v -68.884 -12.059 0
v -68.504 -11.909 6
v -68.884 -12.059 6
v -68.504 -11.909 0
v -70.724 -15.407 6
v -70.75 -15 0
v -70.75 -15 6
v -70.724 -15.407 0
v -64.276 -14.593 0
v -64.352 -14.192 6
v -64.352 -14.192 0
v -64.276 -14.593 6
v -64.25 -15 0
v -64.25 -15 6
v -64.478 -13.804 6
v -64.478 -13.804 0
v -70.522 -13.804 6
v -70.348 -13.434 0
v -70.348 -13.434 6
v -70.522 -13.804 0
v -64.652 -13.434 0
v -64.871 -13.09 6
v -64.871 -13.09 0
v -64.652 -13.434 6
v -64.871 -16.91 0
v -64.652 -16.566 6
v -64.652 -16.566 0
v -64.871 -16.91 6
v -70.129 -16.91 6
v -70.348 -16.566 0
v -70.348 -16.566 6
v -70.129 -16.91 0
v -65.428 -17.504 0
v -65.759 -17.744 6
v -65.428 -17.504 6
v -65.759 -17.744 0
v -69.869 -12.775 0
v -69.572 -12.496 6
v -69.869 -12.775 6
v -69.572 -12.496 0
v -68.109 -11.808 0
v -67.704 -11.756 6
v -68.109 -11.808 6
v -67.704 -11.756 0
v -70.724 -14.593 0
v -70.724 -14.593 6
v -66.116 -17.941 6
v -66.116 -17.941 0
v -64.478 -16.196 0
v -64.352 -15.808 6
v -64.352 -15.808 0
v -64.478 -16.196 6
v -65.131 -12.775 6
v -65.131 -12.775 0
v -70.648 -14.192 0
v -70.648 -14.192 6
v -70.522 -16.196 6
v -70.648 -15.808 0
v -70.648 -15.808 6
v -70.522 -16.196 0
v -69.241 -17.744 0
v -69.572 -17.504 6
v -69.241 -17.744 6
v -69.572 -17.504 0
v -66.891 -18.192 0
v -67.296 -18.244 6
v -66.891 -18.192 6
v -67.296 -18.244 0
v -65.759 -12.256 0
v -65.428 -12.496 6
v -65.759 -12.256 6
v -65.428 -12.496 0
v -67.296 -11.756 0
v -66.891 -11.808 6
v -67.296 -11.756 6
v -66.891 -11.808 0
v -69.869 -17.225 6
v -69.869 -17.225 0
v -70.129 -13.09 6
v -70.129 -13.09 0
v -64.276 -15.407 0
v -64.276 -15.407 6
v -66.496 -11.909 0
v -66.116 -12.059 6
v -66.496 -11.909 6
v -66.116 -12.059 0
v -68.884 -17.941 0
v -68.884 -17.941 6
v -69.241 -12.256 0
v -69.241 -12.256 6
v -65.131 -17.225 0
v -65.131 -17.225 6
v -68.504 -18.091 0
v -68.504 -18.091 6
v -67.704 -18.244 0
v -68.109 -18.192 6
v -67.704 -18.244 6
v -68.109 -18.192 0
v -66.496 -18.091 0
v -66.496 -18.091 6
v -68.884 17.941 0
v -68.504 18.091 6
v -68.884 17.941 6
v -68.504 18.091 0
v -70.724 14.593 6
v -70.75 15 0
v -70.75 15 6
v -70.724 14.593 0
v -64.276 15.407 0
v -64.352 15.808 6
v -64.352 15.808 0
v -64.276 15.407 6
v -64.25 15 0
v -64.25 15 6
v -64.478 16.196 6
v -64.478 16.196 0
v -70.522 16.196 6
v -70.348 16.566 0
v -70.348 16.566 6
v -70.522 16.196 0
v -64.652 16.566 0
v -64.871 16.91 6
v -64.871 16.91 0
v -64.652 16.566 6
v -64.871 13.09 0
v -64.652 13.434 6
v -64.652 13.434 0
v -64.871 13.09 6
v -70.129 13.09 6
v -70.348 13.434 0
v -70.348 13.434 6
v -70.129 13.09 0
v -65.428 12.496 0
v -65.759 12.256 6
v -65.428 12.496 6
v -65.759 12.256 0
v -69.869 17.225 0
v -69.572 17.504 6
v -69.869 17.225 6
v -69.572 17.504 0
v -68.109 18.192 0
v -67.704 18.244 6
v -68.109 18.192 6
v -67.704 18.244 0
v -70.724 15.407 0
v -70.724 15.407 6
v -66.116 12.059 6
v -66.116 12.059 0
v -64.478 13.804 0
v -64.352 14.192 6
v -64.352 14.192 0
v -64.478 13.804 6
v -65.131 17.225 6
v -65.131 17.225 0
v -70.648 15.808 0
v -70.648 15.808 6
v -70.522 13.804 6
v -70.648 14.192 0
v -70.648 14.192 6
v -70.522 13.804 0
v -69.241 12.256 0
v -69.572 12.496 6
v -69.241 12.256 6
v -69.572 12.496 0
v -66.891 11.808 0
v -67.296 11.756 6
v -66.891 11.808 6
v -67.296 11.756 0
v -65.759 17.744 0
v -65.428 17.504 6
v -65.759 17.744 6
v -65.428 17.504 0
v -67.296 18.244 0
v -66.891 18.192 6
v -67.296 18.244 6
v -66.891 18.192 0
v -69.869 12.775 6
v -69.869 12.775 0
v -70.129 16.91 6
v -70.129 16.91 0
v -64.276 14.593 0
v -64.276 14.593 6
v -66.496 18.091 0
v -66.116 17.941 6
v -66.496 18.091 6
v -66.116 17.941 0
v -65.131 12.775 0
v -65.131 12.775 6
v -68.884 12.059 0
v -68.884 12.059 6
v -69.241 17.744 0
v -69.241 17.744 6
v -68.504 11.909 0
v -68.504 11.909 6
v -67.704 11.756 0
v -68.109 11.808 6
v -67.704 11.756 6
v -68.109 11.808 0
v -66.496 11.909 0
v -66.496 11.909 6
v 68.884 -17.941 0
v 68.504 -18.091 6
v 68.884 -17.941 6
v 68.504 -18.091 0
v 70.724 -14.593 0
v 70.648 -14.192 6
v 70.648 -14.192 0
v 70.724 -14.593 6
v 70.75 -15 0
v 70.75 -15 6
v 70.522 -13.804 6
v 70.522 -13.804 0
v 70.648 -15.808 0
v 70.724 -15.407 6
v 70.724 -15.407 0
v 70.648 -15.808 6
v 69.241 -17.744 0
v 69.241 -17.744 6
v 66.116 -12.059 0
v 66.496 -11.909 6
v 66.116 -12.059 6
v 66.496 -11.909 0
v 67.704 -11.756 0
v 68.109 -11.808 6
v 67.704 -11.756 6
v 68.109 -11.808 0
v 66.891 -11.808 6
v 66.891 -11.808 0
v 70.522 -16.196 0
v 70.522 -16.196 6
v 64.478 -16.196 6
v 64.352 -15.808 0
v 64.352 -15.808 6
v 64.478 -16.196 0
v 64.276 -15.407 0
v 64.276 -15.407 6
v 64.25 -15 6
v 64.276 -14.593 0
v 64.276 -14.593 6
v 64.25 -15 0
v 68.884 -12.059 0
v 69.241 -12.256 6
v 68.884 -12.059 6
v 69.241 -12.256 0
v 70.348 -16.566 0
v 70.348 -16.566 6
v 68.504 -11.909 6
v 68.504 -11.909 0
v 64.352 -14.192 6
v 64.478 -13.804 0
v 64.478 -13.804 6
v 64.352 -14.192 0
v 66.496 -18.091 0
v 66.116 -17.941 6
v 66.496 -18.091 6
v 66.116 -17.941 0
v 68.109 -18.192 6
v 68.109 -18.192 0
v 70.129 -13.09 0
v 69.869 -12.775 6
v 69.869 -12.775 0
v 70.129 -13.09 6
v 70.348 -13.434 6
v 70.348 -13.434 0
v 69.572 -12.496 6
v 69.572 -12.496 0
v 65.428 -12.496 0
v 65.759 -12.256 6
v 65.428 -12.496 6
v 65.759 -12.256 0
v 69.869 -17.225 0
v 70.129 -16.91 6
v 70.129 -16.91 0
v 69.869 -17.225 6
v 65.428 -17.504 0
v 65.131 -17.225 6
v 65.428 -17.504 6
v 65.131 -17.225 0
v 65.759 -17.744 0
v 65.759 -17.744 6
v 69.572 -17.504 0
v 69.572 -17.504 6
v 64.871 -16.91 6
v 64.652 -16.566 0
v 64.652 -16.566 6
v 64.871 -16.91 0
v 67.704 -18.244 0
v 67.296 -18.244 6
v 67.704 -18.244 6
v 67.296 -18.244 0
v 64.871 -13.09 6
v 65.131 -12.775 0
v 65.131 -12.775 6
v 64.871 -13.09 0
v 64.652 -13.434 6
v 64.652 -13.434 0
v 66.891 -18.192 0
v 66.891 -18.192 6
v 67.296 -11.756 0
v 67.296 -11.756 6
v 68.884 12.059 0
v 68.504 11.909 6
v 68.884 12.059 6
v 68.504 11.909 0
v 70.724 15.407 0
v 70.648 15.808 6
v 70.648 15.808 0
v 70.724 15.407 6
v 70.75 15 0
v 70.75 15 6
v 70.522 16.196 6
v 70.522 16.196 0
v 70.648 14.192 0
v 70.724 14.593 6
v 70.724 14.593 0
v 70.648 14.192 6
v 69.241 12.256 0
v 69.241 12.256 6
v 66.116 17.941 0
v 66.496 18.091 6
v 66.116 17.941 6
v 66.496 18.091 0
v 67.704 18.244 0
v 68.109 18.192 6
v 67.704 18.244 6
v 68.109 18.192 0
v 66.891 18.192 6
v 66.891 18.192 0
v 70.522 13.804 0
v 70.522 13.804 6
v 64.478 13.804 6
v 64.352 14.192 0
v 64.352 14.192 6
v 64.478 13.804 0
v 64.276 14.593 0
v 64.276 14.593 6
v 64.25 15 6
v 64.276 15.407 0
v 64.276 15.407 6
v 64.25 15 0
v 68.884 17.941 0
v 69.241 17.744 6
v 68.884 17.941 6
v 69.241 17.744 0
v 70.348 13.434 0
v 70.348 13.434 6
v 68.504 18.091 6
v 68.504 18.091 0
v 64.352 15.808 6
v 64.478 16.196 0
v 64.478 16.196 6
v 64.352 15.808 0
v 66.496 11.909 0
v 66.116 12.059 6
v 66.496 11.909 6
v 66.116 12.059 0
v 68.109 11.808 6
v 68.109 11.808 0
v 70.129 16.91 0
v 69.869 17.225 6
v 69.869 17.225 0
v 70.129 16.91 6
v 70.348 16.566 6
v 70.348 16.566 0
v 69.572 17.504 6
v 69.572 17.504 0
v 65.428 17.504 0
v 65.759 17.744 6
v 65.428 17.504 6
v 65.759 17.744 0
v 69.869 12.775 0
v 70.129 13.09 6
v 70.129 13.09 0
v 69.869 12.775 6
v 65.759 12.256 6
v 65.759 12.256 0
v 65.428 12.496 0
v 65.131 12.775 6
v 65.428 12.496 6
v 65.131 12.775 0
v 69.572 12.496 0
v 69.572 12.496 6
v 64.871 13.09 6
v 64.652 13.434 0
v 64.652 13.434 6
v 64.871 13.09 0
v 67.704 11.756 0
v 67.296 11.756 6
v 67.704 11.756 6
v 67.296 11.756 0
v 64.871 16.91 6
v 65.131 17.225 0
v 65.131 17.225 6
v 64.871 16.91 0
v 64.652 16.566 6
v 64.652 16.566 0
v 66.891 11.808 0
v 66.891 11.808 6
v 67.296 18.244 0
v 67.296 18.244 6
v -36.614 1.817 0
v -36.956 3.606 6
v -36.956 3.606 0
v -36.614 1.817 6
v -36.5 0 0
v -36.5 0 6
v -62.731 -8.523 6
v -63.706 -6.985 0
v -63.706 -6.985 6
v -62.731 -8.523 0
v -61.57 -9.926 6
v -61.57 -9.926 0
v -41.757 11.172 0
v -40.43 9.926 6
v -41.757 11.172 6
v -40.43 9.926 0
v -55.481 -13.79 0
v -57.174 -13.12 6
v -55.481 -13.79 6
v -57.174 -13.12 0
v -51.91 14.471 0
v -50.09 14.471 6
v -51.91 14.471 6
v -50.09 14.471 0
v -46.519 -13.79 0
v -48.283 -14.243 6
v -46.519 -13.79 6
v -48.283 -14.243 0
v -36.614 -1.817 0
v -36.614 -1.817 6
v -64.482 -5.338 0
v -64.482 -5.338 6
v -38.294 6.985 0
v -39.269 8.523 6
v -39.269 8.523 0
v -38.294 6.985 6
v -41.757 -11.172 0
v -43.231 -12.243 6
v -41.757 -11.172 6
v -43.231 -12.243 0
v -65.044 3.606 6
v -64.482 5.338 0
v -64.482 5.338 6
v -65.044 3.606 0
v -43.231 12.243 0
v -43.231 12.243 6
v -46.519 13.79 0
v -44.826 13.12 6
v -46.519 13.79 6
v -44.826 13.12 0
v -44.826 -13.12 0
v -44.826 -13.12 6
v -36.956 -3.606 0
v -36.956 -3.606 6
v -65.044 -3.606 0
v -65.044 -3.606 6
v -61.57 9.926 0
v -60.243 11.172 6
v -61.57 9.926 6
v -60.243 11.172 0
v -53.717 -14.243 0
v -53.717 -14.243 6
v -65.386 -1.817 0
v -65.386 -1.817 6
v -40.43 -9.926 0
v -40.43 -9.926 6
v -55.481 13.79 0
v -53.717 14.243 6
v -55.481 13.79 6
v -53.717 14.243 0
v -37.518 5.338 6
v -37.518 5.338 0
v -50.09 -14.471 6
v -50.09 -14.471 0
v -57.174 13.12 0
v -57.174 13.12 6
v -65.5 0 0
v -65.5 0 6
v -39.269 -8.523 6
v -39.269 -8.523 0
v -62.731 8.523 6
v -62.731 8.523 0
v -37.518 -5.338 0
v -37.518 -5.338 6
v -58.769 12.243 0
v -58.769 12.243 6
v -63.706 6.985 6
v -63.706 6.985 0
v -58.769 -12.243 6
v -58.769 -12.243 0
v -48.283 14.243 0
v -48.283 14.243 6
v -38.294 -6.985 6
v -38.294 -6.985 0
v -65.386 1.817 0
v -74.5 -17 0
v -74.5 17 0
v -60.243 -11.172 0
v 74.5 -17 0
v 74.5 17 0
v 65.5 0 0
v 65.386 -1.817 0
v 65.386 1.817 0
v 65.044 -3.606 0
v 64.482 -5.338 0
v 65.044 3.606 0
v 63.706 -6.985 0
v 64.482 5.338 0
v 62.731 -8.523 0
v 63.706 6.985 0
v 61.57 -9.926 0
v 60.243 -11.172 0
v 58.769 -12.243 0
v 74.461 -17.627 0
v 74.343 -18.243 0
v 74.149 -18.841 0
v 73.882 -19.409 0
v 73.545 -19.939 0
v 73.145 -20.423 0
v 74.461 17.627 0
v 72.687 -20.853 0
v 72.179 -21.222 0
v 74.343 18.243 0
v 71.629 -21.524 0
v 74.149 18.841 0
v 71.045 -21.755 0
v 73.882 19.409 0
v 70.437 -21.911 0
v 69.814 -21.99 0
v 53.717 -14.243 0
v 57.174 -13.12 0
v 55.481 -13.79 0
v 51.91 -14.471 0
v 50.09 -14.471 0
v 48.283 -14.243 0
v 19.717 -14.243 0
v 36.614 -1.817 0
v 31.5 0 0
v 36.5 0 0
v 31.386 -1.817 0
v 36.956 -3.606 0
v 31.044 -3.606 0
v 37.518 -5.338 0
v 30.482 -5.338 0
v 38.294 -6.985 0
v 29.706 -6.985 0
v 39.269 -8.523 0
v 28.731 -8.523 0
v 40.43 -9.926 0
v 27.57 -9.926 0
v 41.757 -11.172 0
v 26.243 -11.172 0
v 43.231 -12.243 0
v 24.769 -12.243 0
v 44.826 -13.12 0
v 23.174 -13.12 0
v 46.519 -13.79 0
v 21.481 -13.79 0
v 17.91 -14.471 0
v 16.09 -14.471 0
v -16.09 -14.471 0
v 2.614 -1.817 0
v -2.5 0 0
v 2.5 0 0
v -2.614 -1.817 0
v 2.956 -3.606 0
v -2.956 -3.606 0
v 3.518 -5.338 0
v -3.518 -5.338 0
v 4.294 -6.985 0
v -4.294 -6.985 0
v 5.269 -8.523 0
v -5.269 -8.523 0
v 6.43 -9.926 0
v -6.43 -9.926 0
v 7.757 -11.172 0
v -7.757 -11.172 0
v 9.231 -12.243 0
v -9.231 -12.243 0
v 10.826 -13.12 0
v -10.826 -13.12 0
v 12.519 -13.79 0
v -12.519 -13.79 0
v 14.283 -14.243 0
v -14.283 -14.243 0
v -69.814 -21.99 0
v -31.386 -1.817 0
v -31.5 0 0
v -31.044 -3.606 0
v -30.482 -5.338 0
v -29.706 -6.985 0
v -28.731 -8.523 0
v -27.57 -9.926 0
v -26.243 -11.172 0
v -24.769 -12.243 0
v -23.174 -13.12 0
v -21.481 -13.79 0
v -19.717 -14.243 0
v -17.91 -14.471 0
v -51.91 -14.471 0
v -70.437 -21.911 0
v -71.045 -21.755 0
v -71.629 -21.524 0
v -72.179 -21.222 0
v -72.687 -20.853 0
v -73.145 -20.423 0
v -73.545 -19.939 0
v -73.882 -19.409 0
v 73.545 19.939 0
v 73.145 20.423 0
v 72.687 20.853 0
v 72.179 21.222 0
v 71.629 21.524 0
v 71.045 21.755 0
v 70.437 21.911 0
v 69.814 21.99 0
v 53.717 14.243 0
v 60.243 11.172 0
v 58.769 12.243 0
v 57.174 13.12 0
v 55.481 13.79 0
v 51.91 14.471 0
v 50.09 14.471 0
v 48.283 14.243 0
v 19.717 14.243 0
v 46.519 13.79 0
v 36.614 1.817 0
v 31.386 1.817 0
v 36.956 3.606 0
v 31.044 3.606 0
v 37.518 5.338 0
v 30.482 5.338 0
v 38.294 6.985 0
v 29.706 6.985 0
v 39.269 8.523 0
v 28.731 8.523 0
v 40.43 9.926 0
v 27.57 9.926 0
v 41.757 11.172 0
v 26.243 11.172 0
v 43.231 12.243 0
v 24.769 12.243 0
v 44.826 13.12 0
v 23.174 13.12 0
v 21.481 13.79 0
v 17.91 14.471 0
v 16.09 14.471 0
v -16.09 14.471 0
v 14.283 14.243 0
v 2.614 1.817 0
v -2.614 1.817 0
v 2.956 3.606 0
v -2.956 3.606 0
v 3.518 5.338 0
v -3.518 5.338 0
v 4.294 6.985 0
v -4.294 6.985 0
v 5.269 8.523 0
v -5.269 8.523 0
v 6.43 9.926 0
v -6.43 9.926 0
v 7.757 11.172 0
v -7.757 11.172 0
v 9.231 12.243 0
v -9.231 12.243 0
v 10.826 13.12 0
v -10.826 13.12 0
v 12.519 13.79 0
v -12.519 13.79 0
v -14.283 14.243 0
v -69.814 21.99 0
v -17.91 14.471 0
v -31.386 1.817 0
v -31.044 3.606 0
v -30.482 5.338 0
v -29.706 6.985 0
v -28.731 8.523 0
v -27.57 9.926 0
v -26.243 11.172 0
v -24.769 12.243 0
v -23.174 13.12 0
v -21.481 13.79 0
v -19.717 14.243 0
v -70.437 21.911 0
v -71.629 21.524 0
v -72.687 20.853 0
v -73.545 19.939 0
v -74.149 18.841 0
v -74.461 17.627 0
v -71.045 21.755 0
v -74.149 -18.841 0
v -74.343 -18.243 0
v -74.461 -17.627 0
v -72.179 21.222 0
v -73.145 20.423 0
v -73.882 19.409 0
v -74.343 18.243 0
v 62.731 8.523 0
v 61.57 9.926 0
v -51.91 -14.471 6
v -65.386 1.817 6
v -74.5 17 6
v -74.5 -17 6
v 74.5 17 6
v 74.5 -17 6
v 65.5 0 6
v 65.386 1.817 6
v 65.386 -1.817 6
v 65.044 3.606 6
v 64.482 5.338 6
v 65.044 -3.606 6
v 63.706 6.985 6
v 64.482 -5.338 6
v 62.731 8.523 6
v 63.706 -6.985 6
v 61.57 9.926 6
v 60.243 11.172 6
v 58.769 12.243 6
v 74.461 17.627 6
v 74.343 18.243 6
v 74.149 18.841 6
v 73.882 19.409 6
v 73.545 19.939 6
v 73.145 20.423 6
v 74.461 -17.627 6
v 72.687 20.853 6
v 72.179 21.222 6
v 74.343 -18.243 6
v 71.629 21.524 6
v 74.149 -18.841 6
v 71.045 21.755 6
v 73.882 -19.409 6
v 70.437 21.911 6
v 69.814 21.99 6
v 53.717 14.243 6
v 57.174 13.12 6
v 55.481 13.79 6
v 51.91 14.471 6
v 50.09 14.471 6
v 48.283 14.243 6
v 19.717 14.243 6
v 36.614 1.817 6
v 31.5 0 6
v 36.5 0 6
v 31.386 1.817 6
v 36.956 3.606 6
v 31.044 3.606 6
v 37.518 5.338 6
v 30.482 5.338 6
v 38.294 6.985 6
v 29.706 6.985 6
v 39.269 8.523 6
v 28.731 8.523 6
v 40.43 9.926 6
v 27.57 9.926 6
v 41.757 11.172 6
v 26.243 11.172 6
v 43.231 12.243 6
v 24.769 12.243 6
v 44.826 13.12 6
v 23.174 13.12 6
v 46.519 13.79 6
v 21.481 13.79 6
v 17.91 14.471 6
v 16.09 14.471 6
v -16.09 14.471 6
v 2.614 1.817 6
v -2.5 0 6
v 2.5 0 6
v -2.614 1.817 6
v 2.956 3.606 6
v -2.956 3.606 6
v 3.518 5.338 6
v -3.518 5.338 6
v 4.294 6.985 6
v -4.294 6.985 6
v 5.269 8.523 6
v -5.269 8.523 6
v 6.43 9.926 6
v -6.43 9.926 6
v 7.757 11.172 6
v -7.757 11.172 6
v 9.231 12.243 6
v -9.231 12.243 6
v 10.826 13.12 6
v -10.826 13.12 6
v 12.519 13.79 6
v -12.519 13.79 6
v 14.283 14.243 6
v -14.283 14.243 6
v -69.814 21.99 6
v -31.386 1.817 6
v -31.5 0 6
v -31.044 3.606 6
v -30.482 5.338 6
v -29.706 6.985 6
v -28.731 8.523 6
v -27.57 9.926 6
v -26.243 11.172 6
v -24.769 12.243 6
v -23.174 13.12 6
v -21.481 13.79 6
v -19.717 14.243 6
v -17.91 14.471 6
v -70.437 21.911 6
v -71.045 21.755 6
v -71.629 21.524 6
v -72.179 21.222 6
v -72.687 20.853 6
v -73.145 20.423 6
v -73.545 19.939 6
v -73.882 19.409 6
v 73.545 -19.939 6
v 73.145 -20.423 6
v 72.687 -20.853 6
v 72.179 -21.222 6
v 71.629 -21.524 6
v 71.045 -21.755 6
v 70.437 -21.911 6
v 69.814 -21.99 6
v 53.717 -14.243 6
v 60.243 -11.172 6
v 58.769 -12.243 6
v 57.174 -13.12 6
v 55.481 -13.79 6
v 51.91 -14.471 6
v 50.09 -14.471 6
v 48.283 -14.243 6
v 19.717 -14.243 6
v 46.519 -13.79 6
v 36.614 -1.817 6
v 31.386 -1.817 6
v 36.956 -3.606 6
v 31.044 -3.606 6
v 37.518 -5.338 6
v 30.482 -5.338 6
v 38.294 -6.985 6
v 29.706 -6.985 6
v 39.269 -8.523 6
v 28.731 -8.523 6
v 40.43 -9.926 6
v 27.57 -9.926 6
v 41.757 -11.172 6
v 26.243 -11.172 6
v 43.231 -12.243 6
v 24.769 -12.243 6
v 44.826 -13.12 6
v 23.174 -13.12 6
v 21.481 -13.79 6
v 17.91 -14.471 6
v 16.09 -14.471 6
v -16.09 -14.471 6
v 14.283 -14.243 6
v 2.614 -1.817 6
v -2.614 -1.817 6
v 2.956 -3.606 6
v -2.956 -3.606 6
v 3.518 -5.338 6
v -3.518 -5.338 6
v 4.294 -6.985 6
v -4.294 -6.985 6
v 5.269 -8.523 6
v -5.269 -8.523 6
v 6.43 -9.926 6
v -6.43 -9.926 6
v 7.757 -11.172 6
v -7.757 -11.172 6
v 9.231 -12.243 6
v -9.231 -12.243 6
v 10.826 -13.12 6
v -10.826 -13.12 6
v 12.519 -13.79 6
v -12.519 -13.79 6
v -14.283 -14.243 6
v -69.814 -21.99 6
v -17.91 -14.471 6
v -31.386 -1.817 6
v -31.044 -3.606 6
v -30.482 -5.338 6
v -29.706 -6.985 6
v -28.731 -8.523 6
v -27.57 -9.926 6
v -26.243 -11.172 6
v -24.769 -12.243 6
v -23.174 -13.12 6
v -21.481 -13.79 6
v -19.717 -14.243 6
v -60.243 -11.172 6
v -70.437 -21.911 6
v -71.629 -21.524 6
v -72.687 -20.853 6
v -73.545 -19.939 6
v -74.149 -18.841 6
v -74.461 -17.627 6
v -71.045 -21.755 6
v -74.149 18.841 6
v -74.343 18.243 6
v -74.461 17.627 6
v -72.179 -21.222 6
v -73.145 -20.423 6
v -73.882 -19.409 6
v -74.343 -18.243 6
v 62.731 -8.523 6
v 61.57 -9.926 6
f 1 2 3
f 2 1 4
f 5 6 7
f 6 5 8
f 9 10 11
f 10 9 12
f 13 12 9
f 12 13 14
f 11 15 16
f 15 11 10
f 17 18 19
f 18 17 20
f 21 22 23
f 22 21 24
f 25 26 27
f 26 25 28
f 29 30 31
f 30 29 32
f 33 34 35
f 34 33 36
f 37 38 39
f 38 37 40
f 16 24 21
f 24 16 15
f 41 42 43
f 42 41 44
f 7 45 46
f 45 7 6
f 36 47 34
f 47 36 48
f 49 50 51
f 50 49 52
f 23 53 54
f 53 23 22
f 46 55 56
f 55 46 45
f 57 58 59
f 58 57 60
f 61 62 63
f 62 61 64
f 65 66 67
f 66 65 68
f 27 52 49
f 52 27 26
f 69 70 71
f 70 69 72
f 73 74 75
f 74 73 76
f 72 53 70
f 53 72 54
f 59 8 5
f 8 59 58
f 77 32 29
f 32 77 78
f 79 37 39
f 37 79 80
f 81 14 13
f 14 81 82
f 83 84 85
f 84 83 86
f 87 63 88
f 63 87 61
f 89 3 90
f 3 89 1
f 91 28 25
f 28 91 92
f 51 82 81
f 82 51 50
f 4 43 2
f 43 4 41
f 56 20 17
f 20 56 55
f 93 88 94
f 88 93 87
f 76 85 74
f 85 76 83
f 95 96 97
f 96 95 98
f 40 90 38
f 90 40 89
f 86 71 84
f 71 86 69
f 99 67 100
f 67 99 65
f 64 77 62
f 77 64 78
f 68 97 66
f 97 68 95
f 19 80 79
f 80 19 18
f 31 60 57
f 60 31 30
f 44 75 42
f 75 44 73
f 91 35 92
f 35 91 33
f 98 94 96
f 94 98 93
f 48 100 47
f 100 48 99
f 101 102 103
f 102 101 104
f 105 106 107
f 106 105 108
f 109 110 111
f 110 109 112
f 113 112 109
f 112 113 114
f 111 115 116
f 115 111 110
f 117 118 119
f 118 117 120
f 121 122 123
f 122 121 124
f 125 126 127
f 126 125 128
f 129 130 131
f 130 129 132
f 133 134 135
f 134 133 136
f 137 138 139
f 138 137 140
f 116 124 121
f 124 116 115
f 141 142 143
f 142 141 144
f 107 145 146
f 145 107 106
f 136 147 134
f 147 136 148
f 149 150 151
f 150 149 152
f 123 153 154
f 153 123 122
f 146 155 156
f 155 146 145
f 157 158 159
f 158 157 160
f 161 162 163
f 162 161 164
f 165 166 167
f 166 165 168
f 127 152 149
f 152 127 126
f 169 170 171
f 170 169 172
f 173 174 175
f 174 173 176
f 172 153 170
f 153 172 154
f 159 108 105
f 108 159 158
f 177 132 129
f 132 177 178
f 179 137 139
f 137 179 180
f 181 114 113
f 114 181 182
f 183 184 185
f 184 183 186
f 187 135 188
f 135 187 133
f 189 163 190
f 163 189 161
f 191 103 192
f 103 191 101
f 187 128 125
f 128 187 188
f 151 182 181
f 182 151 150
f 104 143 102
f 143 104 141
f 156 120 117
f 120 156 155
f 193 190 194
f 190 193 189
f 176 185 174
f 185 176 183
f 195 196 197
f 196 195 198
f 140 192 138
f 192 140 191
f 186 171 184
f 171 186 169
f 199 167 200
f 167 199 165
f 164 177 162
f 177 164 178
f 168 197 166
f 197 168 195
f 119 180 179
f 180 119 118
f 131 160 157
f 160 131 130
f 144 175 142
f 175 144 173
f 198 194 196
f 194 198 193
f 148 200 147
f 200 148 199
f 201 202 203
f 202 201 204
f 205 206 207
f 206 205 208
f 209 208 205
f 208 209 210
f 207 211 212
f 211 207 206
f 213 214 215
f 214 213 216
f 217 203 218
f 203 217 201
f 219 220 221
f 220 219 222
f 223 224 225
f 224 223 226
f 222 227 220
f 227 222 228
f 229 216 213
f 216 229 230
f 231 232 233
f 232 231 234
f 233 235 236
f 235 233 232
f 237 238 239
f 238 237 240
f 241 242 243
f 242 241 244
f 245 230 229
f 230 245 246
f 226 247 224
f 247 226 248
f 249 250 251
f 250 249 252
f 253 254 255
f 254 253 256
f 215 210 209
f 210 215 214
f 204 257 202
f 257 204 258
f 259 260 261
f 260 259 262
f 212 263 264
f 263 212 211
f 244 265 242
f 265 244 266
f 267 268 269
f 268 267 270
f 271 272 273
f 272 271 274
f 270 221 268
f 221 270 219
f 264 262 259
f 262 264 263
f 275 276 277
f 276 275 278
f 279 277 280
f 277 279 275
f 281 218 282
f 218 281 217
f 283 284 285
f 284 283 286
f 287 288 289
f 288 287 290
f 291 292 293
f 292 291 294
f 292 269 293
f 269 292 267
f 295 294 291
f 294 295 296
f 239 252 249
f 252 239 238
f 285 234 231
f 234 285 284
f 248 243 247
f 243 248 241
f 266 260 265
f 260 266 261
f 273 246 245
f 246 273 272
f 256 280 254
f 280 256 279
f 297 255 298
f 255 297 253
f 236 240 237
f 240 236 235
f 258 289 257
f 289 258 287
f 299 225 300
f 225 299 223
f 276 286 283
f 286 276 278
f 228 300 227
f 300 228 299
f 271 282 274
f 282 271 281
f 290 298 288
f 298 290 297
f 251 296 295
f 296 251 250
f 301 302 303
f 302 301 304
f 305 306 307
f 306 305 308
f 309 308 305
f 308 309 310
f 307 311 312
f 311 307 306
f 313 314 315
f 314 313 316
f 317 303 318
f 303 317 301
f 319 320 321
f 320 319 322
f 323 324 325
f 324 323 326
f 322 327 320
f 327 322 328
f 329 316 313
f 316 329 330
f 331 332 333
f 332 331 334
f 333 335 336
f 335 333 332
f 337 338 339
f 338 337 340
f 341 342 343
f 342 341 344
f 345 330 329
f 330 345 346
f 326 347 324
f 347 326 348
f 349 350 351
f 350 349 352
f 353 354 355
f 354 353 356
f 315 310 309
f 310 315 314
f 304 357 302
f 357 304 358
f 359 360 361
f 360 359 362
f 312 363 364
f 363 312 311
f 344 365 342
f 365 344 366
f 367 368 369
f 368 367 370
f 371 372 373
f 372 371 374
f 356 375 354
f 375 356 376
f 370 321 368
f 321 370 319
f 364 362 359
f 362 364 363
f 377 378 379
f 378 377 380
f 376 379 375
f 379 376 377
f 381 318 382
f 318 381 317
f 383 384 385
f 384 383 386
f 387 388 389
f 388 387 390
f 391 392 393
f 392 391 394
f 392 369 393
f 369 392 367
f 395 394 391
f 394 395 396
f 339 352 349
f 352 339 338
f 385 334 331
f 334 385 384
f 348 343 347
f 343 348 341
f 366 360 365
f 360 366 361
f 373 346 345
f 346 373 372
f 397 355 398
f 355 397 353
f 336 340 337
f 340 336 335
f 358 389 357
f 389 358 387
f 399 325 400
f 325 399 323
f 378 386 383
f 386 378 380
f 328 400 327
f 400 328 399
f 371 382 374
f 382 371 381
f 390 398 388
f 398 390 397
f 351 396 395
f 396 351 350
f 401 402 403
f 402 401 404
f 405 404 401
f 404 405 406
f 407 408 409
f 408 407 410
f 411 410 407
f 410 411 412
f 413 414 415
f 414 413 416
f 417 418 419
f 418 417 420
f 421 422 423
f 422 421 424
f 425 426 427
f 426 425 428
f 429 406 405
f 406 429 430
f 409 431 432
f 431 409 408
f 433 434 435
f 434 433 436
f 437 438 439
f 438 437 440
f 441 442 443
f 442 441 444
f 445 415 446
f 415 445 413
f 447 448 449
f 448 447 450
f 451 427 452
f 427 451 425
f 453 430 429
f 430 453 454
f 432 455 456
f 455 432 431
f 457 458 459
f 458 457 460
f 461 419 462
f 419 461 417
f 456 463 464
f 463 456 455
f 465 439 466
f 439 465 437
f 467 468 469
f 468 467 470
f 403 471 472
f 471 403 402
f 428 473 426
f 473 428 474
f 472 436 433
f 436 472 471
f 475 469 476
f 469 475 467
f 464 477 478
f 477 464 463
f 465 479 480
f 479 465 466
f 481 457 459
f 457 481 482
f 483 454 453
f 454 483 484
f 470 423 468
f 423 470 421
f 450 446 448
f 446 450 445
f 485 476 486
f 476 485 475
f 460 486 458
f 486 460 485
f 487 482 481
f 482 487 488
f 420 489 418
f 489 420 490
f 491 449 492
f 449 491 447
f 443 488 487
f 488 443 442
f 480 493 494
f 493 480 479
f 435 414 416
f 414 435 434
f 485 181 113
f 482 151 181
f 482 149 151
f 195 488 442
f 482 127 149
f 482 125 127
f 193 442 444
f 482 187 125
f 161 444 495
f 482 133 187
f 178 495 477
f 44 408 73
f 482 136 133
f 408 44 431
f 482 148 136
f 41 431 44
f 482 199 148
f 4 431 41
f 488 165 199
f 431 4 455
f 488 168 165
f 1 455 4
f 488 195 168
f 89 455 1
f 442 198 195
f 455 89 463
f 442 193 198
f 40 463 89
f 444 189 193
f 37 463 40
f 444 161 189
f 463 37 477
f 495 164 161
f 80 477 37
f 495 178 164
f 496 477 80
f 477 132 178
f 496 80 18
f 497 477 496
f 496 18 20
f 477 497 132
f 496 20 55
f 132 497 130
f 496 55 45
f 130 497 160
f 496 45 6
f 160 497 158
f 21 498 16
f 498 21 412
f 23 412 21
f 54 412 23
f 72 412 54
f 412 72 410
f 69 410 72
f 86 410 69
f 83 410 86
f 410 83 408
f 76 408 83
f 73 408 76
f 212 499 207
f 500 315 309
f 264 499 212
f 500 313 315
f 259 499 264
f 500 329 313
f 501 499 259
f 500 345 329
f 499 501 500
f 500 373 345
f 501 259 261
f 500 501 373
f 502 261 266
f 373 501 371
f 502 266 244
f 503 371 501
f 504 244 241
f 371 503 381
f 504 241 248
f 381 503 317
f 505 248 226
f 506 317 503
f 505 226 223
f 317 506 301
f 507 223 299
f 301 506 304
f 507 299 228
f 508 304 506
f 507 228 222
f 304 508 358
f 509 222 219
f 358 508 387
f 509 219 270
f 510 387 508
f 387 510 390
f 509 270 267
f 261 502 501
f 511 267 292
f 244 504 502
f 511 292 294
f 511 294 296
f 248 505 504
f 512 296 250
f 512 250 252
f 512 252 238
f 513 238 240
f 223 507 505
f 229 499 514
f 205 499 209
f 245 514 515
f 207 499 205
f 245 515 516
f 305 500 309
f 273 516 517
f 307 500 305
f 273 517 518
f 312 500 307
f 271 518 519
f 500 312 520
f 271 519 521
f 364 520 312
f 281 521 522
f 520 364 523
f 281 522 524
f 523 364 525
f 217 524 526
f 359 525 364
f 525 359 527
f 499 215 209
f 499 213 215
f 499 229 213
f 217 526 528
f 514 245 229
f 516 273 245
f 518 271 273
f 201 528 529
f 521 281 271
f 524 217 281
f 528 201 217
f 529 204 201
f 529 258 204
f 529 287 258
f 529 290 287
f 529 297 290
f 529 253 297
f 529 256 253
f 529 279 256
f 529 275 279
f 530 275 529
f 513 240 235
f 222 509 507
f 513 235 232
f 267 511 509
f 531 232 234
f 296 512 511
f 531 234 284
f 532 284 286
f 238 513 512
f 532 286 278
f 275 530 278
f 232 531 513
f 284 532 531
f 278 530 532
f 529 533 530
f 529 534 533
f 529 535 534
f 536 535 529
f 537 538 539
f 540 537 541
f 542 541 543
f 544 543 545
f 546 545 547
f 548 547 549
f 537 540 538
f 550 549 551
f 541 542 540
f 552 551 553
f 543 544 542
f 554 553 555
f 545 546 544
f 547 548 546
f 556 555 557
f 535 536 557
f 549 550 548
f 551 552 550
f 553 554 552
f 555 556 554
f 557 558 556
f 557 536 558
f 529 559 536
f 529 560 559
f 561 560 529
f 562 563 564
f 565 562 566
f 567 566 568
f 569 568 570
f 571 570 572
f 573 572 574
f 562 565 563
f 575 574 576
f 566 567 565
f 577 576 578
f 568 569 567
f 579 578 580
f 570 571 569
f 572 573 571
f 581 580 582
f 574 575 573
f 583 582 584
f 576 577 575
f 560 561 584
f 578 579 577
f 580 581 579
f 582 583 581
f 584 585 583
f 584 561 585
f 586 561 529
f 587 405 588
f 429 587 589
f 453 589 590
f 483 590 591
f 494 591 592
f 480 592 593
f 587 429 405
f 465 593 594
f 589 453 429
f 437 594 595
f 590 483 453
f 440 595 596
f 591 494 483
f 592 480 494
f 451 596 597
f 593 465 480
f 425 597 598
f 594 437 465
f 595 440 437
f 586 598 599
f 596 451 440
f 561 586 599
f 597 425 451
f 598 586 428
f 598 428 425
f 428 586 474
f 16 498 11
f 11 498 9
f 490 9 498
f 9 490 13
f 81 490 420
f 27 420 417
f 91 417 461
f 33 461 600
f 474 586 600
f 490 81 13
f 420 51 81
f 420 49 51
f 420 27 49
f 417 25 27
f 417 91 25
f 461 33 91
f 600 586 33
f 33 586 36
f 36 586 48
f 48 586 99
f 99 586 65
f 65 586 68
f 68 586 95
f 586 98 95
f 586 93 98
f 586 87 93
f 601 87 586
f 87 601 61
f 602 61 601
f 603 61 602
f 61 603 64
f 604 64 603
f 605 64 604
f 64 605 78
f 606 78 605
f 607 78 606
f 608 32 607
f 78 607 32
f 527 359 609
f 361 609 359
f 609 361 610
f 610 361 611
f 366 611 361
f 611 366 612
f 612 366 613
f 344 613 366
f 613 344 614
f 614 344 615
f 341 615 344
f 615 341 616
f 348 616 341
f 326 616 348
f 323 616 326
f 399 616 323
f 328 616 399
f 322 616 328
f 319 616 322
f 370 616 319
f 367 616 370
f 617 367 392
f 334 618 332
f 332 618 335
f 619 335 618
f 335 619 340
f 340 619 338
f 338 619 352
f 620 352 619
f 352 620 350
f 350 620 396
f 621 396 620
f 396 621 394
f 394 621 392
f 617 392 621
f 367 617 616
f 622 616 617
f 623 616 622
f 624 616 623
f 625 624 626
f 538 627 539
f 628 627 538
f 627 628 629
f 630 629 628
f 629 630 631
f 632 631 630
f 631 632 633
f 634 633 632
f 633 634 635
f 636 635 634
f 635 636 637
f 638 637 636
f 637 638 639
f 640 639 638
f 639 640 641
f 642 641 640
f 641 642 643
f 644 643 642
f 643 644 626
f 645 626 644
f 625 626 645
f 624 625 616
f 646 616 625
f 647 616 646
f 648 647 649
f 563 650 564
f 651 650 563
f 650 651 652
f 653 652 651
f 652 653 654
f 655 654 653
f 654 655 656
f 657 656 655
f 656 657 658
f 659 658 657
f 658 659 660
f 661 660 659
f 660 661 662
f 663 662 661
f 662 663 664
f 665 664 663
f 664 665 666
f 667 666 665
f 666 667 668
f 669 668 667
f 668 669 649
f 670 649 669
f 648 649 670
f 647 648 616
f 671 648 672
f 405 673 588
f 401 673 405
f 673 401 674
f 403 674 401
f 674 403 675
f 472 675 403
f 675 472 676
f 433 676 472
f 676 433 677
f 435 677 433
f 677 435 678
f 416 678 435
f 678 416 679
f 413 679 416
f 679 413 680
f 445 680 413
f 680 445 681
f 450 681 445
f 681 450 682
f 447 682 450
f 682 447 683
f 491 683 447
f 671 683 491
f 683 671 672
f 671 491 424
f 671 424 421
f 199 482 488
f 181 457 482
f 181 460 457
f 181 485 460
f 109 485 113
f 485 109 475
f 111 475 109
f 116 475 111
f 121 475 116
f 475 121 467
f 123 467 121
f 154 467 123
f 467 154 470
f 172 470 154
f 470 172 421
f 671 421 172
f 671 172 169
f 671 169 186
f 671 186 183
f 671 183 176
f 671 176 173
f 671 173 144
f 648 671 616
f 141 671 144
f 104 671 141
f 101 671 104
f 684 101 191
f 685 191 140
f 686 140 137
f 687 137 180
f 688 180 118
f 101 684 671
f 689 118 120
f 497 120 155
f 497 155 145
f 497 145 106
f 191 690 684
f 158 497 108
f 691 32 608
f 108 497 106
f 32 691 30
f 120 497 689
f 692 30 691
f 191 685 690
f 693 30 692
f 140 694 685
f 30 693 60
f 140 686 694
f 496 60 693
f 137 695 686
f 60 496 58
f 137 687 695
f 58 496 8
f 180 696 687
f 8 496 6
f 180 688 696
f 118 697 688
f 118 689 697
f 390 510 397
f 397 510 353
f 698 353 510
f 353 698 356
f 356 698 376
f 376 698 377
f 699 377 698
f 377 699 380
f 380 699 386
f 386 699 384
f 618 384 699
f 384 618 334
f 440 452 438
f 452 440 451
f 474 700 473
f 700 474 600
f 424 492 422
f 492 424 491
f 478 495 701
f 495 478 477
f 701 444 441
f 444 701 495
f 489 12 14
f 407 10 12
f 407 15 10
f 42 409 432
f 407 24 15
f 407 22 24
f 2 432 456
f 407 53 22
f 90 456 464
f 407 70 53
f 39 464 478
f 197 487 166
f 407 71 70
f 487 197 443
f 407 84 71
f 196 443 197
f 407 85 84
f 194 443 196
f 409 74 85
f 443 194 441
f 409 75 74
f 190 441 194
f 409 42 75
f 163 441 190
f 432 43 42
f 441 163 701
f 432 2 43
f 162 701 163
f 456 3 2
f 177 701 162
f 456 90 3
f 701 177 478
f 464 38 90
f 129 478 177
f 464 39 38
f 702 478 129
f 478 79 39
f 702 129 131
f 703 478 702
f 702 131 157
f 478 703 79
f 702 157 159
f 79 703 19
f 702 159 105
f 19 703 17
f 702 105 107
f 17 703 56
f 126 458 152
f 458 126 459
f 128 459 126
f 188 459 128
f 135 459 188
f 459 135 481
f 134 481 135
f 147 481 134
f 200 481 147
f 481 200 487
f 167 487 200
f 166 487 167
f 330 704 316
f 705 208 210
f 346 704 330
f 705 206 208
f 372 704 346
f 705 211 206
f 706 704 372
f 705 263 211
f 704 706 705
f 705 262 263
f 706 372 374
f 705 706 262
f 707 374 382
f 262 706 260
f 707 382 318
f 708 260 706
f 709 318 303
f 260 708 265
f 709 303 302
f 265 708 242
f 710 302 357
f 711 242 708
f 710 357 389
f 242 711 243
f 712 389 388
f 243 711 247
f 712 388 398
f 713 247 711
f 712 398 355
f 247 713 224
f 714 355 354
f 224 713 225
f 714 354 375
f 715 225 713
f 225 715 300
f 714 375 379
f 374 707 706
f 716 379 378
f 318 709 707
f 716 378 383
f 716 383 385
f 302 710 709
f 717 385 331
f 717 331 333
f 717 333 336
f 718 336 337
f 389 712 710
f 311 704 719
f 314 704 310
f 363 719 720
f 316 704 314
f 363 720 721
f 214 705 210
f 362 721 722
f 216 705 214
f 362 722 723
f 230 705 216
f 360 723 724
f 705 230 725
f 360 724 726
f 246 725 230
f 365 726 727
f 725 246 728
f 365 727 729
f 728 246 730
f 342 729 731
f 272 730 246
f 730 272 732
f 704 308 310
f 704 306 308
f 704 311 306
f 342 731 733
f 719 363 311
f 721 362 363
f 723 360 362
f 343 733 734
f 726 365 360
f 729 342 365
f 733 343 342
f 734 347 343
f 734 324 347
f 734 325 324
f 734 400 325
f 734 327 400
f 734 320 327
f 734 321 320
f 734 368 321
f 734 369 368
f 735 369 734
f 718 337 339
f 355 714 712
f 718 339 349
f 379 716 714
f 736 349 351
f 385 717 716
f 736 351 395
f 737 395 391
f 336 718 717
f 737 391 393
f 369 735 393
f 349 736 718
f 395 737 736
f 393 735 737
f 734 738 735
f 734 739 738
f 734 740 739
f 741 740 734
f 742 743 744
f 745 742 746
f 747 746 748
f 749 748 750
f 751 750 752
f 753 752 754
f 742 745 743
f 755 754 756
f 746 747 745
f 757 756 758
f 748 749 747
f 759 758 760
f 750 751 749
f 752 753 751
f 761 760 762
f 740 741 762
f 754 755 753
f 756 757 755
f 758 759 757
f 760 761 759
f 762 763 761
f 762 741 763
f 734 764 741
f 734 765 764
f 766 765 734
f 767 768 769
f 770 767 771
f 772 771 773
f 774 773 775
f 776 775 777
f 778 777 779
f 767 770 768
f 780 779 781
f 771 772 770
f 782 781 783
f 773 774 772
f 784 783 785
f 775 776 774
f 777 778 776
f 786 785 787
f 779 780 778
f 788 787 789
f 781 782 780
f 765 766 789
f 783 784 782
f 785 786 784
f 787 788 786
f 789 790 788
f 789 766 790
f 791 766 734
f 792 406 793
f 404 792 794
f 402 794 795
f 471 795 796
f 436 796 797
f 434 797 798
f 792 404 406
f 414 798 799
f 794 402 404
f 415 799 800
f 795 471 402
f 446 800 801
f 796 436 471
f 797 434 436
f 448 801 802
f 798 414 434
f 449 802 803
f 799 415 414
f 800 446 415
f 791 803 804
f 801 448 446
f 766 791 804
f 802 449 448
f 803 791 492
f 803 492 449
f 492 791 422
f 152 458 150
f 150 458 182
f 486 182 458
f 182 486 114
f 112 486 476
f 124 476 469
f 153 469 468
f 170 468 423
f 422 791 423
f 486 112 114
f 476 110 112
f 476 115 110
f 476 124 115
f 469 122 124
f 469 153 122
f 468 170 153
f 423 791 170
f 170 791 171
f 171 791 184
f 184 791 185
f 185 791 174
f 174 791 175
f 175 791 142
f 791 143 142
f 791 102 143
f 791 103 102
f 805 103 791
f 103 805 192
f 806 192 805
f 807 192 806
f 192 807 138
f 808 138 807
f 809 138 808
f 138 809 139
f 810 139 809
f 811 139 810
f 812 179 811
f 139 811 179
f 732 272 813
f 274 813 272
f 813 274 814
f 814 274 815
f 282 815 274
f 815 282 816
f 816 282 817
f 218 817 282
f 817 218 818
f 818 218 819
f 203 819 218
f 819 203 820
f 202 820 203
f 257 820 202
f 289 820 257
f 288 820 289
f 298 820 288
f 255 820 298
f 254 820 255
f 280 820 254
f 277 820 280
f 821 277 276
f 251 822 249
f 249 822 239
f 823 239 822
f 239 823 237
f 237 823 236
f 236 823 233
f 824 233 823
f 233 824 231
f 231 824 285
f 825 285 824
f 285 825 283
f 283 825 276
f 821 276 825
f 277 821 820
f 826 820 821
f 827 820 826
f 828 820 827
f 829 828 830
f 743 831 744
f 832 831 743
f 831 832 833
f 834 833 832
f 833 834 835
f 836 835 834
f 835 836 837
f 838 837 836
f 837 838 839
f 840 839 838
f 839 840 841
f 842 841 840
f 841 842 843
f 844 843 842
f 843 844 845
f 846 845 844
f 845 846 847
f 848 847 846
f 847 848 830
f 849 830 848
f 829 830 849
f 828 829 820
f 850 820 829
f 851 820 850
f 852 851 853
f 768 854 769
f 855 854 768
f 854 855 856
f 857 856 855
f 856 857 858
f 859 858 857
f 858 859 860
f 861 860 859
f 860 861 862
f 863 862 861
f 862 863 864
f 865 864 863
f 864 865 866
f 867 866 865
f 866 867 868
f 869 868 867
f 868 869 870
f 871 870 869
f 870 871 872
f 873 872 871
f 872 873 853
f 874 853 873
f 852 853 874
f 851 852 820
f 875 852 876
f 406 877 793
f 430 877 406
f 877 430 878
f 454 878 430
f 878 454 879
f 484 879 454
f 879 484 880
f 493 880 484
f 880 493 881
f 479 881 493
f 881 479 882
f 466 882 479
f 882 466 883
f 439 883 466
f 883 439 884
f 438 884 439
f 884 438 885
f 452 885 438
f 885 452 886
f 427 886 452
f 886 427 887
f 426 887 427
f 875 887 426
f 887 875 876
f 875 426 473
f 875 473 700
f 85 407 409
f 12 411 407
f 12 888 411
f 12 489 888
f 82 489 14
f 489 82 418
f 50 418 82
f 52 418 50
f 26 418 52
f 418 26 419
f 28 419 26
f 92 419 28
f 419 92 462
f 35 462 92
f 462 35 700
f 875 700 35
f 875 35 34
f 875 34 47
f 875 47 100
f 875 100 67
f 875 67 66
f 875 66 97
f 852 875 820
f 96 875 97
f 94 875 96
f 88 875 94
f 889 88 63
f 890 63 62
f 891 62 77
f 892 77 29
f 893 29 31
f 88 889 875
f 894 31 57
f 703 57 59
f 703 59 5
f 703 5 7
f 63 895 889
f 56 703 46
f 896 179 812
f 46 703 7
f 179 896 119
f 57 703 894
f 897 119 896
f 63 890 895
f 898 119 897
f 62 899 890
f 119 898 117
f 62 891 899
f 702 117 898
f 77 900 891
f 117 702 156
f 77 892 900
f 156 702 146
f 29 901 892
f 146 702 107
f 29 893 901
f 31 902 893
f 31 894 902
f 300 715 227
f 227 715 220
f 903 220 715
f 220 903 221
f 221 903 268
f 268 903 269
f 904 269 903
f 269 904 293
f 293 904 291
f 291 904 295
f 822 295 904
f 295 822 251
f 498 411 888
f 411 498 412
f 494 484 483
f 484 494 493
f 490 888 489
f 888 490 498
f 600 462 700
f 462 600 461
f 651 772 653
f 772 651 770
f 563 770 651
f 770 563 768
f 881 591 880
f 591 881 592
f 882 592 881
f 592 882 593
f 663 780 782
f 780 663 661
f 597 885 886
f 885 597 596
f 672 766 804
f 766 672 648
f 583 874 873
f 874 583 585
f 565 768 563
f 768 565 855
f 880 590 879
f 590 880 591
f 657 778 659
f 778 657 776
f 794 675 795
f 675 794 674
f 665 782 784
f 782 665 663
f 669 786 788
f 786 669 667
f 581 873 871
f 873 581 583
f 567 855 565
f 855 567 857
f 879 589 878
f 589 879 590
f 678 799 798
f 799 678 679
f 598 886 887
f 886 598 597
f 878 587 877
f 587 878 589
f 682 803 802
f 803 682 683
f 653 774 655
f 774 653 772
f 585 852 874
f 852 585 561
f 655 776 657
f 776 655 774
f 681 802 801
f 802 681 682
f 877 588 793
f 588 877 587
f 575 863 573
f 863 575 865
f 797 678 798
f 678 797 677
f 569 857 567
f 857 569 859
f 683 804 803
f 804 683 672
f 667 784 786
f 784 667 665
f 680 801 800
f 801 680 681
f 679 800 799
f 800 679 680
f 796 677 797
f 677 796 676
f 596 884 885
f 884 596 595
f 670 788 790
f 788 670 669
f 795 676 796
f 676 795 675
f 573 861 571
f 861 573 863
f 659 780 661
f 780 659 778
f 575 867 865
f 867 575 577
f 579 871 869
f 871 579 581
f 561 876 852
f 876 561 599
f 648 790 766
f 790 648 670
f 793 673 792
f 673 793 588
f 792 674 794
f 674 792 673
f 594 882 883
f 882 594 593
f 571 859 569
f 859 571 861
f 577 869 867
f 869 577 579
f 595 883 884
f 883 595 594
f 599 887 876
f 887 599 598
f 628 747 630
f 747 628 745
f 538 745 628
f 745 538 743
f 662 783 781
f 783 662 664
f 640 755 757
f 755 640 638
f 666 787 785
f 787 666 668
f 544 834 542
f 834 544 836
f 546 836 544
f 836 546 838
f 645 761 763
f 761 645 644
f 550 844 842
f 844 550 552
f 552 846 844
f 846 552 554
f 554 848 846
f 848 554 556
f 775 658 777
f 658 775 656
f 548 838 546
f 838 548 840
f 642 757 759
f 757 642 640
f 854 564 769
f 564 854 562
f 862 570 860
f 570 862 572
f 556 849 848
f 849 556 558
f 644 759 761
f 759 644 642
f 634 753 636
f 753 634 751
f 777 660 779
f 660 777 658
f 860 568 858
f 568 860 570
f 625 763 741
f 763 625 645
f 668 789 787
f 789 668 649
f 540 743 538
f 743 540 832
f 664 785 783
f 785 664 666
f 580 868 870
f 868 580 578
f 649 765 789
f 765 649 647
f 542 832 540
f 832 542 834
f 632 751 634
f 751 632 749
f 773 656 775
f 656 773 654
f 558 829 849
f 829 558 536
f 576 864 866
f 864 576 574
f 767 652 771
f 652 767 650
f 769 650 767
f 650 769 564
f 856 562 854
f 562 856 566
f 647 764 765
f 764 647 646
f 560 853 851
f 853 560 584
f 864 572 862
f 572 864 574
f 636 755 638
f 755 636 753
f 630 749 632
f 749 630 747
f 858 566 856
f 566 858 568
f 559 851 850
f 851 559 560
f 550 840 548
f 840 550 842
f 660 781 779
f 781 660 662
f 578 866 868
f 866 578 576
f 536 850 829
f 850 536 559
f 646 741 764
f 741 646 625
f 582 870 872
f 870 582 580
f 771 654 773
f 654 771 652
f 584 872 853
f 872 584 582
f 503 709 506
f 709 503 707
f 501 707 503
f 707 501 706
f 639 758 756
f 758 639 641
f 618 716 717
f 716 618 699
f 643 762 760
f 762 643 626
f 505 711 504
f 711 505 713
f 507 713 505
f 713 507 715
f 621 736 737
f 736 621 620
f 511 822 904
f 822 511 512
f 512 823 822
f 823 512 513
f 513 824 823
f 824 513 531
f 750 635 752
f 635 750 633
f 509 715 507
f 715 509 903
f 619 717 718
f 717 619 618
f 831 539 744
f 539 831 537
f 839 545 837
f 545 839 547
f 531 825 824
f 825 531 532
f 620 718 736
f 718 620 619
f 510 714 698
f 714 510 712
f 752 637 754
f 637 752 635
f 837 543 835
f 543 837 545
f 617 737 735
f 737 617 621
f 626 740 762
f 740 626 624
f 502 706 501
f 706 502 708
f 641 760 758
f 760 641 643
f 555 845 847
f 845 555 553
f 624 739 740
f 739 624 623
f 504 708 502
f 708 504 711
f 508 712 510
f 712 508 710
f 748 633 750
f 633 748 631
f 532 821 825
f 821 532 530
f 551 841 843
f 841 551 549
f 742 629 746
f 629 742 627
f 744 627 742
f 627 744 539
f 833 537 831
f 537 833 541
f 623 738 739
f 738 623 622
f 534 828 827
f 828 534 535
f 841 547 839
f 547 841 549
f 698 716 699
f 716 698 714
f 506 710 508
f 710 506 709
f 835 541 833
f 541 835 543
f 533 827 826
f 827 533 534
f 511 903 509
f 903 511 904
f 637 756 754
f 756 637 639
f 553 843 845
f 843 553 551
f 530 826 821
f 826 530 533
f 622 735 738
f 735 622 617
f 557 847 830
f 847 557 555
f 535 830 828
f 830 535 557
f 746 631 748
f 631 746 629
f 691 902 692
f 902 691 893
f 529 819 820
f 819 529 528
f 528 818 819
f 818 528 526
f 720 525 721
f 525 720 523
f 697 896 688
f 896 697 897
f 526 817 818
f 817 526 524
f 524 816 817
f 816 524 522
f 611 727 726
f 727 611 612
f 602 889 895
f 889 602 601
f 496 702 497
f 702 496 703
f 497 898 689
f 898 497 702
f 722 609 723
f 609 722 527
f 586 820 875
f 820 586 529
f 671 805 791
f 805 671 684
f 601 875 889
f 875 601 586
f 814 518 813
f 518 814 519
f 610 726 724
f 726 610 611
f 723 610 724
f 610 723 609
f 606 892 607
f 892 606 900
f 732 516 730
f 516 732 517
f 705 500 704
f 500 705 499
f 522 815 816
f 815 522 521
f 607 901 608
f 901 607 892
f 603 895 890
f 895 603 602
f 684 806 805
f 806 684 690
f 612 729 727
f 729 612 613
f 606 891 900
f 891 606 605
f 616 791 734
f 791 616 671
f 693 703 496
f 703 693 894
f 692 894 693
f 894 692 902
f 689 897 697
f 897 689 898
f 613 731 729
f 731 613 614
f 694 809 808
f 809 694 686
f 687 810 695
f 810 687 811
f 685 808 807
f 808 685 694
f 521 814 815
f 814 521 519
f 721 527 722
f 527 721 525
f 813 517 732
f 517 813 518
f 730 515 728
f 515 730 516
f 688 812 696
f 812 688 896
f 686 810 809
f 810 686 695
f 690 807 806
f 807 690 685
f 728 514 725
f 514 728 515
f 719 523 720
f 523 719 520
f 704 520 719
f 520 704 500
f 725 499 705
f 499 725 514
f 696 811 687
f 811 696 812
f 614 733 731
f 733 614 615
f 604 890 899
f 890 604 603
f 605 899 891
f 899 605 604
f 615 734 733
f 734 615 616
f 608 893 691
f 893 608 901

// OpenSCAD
$fn = 50;

difference() {
	union() {
		hull() {
			translate(v = [-69.5, 17.0, 0]) {
				cylinder(h = 6, r = 5);
			}
			translate(v = [69.5, 17.0, 0]) {
				cylinder(h = 6, r = 5);
			}
			translate(v = [-69.5, -17.0, 0]) {
				cylinder(h = 6, r = 5);
			}
			translate(v = [69.5, -17.0, 0]) {
				cylinder(h = 6, r = 5);
			}
		}
	}
	union() {
		translate(v = [-67.5, -15.0, -100.0]) {
			cylinder(h = 200, r = 3.25);
		}
		translate(v = [-67.5, 15.0, -100.0]) {
			cylinder(h = 200, r = 3.25);
		}
		translate(v = [67.5, -15.0, -100.0]) {
			cylinder(h = 200, r = 3.25);
		}
		translate(v = [67.5, 15.0, -100.0]) {
			cylinder(h = 200, r = 3.25);
		}
		translate(v = [-67.5, -15.0, -100.0]) {
			cylinder(h = 200, r = 1.8);
		}
		translate(v = [-67.5, 15.0, -100.0]) {
			cylinder(h = 200, r = 1.8);
		}
		translate(v = [67.5, -15.0, -100.0]) {
			cylinder(h = 200, r = 1.8);
		}
		translate(v = [67.5, 15.0, -100.0]) {
			cylinder(h = 200, r = 1.8);
		}
		translate(v = [-51.0, 0, 0.0]) {
			cylinder(h = 6, r = 14.5);
		}
		translate(v = [-17.0, 0, 0.0]) {
			cylinder(h = 6, r = 14.5);
		}
		translate(v = [17.0, 0, 0.0]) {
			cylinder(h = 6, r = 14.5);
		}
		translate(v = [51.0, 0, 0.0]) {
			cylinder(h = 6, r = 14.5);
		}
	}
}
